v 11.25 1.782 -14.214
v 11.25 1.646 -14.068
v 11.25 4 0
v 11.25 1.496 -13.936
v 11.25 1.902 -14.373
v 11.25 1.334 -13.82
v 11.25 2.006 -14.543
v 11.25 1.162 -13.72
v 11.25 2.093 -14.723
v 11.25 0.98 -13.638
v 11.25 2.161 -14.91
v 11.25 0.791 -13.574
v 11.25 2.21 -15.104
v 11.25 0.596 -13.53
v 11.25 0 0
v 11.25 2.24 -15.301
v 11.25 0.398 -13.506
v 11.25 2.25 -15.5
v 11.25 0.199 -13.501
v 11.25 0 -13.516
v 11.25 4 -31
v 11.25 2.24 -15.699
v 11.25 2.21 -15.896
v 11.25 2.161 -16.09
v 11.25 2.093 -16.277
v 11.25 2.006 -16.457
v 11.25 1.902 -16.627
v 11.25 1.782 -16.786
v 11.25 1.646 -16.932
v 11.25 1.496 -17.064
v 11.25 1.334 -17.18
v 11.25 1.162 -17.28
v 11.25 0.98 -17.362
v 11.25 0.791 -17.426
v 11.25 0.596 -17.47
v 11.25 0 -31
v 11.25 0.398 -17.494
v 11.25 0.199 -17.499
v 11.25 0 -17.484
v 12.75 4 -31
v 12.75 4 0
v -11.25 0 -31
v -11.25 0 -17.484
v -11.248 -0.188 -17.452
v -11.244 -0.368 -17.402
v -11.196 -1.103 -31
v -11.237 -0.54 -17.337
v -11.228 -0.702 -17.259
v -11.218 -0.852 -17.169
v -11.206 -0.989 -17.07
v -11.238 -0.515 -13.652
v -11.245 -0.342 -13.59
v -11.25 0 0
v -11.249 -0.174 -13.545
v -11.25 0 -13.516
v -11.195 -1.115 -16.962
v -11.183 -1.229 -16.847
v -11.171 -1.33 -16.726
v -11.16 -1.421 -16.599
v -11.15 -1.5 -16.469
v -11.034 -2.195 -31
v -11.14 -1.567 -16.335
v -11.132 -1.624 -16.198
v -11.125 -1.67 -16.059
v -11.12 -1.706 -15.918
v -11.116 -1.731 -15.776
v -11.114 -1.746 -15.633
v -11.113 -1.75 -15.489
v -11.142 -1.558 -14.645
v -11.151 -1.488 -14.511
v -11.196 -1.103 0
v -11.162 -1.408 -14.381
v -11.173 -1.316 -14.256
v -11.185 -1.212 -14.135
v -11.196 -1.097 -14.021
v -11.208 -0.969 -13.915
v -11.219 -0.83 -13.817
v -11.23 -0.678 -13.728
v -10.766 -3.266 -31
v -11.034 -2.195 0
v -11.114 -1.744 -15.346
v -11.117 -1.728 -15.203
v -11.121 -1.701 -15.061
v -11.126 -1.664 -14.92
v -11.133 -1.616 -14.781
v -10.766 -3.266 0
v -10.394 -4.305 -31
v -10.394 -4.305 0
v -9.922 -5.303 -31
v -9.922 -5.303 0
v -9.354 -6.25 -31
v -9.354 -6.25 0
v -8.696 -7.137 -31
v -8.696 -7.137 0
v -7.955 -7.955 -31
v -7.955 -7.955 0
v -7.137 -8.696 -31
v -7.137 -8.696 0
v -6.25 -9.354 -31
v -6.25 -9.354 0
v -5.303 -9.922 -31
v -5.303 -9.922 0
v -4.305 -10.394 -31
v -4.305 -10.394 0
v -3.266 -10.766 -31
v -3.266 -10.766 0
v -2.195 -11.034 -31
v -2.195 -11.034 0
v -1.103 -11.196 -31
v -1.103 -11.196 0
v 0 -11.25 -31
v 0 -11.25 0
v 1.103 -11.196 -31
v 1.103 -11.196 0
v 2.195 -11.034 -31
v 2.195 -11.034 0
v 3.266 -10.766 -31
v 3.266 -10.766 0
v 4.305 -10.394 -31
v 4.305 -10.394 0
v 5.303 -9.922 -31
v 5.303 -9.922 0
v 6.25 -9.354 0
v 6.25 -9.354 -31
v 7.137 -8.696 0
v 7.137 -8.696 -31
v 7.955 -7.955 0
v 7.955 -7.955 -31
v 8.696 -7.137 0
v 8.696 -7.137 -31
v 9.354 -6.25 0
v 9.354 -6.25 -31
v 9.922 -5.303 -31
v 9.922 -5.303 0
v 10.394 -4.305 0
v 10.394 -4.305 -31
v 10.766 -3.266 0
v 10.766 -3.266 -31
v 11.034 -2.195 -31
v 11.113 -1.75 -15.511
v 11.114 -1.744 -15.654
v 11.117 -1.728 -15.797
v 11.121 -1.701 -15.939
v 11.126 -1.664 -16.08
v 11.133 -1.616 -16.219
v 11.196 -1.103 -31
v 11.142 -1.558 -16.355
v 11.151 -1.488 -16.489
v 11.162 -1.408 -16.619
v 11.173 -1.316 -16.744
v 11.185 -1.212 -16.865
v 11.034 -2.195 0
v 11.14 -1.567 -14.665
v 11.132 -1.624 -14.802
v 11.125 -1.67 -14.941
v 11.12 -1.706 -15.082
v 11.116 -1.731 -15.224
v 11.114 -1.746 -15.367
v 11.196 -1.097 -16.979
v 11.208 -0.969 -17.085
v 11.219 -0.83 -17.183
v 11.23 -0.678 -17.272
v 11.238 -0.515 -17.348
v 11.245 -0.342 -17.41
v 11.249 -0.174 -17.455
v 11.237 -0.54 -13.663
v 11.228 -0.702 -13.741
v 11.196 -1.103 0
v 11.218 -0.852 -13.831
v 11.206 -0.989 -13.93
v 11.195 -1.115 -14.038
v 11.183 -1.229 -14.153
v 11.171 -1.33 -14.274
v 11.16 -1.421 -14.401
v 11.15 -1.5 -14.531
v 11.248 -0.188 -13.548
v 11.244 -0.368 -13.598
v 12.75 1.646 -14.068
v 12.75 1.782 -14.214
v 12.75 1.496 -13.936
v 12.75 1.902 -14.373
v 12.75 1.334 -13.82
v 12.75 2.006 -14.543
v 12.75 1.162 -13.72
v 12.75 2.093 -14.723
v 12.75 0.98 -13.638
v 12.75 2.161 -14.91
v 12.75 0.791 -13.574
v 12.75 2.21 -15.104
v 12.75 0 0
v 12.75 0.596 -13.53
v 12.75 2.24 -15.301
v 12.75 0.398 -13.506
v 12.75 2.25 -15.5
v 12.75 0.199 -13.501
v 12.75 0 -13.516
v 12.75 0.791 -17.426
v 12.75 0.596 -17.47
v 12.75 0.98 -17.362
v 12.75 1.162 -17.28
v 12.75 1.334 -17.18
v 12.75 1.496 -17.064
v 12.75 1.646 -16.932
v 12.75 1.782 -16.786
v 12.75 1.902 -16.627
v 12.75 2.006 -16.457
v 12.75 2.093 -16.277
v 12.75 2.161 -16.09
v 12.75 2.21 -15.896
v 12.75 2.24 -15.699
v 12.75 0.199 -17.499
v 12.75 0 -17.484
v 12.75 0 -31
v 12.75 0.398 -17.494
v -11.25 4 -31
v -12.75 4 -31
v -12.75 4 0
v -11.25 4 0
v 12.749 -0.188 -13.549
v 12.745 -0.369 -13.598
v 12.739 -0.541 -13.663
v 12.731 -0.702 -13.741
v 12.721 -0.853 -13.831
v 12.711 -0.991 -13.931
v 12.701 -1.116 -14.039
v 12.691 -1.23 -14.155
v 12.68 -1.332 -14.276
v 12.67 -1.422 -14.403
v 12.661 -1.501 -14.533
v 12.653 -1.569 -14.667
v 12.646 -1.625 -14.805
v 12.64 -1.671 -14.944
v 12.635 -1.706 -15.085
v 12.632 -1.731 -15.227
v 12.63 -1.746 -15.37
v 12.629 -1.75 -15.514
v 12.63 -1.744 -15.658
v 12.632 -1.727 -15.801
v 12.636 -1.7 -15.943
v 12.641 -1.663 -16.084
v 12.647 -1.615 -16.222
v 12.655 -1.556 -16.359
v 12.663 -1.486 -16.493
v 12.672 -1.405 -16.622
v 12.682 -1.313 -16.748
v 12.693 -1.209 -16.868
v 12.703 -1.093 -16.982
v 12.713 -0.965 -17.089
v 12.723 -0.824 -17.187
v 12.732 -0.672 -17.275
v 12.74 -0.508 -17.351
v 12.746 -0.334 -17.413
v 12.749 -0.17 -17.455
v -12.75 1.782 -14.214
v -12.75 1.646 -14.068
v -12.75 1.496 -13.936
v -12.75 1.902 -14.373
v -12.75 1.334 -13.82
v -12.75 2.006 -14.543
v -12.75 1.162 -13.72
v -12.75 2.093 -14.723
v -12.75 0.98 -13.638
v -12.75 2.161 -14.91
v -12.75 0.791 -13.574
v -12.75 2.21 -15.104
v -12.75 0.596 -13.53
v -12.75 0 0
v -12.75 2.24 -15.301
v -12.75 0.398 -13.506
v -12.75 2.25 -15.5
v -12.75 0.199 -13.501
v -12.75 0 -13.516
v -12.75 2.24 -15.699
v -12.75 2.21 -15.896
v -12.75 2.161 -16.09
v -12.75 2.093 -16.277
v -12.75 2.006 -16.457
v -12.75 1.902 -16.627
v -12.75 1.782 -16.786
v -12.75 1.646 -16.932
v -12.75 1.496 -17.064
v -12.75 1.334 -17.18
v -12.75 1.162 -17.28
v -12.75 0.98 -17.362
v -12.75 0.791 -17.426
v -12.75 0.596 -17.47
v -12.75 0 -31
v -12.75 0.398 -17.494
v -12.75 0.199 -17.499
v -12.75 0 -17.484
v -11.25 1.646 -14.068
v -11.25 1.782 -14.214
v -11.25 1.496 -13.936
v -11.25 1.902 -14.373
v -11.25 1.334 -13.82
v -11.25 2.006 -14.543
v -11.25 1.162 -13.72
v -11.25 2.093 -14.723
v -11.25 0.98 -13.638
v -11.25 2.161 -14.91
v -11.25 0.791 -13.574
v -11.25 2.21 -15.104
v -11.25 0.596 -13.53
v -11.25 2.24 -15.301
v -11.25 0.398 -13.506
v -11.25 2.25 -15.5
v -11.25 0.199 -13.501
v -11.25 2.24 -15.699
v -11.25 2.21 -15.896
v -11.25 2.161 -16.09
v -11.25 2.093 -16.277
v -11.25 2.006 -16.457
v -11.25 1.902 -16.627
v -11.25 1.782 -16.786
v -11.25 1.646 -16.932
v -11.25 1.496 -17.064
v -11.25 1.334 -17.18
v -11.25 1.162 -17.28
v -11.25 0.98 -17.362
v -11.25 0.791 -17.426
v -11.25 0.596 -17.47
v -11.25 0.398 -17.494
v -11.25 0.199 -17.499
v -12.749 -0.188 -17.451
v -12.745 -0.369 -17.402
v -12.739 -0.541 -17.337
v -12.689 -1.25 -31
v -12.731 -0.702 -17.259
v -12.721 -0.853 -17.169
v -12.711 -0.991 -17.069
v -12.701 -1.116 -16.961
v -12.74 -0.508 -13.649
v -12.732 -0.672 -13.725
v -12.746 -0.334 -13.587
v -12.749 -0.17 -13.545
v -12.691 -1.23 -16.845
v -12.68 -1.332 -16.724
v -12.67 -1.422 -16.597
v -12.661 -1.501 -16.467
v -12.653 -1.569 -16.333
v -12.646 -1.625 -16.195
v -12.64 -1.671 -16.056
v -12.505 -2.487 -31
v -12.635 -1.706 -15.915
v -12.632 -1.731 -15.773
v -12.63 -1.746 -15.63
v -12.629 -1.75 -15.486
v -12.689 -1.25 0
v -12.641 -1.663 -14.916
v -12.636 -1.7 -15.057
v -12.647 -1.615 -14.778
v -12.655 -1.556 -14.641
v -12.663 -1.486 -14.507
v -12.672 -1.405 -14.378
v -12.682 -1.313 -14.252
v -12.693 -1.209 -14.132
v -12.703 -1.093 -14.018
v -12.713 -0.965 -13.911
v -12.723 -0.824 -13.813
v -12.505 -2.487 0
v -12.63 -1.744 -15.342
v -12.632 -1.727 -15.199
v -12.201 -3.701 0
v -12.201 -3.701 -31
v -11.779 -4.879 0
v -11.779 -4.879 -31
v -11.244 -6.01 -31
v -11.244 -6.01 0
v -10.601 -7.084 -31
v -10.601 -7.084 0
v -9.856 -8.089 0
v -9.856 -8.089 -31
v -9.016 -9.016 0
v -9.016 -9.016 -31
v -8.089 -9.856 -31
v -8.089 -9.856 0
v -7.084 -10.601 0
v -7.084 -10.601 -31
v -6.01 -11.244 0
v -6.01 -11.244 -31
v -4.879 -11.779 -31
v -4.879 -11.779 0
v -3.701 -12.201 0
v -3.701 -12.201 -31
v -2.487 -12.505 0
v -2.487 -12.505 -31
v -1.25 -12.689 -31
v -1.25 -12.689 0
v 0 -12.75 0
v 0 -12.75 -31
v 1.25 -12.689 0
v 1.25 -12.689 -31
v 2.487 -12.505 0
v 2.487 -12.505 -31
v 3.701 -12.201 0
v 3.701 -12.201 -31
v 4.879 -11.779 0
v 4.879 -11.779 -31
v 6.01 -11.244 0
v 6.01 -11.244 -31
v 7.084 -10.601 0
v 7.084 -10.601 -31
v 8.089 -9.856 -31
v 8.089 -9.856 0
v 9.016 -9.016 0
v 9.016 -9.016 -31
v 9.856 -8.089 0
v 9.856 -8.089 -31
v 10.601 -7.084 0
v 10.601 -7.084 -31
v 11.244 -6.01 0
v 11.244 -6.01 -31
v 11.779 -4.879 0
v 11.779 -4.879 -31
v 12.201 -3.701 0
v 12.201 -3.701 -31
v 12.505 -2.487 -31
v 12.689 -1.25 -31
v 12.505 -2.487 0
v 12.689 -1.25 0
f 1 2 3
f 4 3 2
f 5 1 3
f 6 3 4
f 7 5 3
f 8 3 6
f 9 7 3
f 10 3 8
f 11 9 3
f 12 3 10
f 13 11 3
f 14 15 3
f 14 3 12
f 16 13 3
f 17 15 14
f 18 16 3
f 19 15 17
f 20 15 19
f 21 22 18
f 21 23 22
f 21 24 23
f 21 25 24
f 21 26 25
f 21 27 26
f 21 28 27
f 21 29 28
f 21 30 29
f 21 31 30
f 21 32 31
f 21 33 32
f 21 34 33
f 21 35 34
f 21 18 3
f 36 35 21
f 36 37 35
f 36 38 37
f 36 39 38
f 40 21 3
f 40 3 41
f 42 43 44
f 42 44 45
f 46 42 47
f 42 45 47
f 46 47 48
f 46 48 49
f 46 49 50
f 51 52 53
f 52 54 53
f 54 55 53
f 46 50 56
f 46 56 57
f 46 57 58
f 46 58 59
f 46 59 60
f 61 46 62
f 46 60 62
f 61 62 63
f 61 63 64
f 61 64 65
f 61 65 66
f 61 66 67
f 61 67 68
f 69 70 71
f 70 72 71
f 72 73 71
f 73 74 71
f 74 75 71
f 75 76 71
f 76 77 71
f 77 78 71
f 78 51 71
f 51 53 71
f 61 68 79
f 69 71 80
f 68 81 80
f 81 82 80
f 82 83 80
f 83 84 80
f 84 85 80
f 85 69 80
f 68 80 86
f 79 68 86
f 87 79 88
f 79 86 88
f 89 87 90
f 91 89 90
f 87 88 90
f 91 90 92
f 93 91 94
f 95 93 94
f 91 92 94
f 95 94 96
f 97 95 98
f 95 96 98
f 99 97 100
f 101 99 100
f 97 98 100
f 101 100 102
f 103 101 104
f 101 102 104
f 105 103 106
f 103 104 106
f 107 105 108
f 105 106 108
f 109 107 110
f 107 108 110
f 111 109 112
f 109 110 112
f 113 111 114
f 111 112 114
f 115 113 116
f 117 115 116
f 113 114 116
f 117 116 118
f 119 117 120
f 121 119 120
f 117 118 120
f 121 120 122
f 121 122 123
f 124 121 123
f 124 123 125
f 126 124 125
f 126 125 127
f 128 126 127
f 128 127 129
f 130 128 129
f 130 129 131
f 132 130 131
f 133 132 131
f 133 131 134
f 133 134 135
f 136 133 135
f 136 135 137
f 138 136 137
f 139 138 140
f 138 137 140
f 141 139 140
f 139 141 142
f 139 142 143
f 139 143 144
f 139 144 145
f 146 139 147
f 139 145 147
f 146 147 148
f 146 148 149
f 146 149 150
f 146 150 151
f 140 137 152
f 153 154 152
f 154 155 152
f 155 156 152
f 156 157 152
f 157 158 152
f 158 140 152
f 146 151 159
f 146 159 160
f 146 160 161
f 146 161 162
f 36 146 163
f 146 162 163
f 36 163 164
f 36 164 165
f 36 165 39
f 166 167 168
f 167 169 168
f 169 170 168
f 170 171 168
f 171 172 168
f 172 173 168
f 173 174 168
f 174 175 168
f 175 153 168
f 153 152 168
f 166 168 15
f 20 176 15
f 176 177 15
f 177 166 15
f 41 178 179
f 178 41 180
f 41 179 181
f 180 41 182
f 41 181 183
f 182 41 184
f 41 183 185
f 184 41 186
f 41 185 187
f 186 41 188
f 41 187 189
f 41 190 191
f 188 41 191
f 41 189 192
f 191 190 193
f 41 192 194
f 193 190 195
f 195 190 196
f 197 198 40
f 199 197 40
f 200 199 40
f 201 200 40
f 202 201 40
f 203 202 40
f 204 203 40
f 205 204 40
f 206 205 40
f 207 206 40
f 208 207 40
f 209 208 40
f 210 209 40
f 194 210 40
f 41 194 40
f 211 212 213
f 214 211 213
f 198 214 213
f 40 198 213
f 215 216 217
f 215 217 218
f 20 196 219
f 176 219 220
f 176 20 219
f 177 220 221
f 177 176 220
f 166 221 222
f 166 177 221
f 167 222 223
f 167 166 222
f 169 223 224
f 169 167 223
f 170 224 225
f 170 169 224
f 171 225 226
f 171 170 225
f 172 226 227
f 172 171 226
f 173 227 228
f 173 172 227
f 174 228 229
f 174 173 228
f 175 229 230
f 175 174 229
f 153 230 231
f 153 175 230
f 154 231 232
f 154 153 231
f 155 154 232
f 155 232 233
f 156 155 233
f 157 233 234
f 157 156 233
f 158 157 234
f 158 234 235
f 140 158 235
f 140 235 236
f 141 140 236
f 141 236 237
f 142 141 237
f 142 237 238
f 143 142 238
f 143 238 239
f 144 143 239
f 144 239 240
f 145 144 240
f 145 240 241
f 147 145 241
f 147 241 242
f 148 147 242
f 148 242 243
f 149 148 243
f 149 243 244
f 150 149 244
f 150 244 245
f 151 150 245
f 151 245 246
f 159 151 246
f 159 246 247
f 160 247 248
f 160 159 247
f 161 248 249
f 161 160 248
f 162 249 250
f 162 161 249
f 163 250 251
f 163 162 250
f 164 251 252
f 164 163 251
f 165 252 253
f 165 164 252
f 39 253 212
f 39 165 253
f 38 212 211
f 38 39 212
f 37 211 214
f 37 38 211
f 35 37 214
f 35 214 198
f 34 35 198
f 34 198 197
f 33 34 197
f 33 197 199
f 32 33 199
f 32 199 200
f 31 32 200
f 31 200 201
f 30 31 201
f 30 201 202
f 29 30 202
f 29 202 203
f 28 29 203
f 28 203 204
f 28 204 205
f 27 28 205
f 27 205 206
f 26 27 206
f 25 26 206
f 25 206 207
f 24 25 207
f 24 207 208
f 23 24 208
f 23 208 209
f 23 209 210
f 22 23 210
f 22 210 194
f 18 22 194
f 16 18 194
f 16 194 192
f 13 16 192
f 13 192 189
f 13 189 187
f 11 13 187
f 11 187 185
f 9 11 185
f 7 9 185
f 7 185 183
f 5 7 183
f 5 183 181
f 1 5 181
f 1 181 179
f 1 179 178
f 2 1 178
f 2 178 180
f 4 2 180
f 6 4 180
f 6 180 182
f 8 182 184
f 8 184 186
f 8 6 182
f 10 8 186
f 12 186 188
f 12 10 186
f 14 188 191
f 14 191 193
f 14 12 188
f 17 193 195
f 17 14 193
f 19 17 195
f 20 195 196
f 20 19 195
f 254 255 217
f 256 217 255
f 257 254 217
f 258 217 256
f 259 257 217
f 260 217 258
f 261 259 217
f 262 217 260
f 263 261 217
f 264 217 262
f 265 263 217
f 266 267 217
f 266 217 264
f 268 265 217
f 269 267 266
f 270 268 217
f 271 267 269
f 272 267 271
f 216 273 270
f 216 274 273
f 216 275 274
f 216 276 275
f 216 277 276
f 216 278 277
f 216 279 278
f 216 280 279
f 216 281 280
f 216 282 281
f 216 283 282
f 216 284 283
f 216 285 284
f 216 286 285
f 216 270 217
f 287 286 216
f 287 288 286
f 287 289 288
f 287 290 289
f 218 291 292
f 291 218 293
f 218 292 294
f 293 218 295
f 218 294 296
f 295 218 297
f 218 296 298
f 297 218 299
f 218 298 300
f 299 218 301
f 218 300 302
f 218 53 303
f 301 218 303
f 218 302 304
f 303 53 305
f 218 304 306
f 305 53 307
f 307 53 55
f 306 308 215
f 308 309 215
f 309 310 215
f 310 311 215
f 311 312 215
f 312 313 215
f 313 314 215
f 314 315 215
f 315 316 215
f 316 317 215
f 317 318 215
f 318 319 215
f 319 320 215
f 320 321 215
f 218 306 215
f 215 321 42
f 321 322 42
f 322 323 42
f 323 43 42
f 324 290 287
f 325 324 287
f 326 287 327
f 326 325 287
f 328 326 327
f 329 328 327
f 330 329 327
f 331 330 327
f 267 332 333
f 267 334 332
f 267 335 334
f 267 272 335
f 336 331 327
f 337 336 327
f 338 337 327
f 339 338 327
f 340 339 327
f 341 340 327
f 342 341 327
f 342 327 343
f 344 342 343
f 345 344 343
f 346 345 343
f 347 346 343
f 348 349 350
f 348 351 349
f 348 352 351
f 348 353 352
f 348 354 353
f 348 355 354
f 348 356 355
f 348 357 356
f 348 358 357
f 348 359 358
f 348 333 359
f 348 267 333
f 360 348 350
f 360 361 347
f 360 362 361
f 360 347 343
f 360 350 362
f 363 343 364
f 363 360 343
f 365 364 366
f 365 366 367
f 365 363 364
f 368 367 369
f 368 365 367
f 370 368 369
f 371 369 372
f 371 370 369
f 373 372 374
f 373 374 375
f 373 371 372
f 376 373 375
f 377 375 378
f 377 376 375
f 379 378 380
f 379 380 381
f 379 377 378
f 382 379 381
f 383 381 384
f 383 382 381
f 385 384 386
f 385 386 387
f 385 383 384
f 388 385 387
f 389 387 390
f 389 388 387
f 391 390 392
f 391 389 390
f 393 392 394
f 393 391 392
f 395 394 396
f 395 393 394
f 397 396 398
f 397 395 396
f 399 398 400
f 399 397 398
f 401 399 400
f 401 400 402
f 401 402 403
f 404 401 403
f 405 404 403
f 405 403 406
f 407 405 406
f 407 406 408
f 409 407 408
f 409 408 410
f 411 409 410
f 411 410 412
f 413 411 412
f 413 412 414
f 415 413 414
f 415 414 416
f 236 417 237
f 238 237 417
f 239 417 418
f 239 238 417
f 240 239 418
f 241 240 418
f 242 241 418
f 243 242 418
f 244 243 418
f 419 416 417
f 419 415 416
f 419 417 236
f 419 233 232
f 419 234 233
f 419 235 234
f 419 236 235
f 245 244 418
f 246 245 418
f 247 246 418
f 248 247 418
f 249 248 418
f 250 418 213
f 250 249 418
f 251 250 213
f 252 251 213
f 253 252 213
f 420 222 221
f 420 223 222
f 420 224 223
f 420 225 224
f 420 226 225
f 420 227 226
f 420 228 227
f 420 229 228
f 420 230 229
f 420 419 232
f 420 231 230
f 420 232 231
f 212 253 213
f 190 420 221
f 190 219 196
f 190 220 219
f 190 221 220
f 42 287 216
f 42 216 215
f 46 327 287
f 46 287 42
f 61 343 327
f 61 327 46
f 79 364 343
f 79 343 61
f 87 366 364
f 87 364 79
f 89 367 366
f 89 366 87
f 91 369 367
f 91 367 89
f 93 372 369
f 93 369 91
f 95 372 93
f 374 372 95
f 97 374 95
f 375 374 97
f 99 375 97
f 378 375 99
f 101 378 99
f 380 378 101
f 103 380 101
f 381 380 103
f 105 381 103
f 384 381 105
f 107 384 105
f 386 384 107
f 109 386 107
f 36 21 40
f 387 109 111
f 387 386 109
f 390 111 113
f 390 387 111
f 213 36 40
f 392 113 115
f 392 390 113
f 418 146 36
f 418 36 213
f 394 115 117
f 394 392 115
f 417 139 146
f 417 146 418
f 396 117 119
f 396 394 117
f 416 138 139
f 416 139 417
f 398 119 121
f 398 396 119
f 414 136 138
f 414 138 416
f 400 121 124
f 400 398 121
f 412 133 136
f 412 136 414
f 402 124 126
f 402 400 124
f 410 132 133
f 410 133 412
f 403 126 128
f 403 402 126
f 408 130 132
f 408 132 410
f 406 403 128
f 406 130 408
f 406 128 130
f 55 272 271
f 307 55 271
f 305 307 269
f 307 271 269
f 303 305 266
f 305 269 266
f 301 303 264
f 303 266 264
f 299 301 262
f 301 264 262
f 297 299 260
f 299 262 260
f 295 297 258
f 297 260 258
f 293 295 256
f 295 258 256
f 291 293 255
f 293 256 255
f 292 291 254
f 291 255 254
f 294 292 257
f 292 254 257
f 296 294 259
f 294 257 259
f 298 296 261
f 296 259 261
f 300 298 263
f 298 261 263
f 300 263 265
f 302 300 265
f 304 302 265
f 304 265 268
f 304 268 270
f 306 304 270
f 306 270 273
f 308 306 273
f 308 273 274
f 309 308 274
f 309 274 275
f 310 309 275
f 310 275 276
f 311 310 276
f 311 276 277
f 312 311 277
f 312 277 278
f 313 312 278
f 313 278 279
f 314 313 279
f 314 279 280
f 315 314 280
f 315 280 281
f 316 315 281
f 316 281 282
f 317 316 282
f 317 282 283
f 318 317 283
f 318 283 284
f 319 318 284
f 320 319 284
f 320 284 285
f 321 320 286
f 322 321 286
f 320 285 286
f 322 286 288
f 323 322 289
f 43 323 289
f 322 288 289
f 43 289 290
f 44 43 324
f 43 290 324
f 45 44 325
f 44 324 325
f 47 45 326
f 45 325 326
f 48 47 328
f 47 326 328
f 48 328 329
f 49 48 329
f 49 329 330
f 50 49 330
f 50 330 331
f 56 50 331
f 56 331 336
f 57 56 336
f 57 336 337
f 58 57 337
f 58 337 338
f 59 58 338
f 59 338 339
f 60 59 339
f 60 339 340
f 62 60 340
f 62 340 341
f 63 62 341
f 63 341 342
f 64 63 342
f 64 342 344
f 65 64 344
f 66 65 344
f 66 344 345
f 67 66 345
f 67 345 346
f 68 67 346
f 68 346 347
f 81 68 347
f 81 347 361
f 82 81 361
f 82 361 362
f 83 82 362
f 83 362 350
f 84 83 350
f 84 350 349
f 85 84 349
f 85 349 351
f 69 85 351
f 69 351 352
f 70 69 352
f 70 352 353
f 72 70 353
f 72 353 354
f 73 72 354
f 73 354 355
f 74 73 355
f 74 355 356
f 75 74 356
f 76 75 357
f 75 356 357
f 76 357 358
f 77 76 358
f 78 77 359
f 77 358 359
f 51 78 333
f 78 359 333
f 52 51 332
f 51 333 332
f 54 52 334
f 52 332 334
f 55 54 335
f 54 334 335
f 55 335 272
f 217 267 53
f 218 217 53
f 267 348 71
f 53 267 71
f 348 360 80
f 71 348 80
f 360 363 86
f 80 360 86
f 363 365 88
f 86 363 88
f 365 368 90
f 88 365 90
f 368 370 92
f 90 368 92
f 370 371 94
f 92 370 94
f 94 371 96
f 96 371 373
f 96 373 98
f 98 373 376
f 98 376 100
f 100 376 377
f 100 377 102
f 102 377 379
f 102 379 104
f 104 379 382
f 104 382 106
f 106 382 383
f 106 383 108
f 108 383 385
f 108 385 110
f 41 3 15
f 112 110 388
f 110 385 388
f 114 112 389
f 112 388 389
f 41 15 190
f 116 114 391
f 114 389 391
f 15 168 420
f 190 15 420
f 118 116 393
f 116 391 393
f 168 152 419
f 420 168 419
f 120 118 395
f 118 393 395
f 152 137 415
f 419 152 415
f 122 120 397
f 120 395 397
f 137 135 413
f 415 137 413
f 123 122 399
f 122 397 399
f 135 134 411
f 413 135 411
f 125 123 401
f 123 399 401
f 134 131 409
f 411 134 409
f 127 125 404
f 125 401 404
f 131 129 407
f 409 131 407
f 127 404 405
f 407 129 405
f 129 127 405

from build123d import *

# Parameters (mm, degrees)
SKETCH1_R           = 12.75
BOSS_EXTRUDE1_DEPTH = 31
SKETCH2_R           = 11.25
CUT_EXTRUDE1_DEPTH  = 31
SKETCH3_W           = 26.062962729
SKETCH3_H           = 13.122907939
CUT_EXTRUDE2_DEPTH  = 31
SKETCH8_W           = 1.5
SKETCH8_H           = 31
BOSS_EXTRUDE3_DEPTH = 4
SKETCH11_R          = 2
CUT_EXTRUDE3_DEPTH  = 2
CUT_EXTRUDE4_START  = -2
SKETCH9_R           = 2
CUT_EXTRUDE4_DEPTH  = 2


with BuildPart() as part:
    # Sketch1 → Boss-Extrude1 (new body)
    with BuildSketch(Plane.XY):
        Circle(SKETCH1_R)
    extrude(amount=-BOSS_EXTRUDE1_DEPTH)

    # Sketch2 → Cut-Extrude1 (cut)
    with BuildSketch(Plane.XY):
        Circle(SKETCH2_R)
    extrude(amount=-CUT_EXTRUDE1_DEPTH, mode=Mode.SUBTRACT)

    # Sketch3 → Cut-Extrude2 (cut)
    with BuildSketch(Plane.XY):
        with Locations((0.281481365, 6.56145397)):
            Rectangle(SKETCH3_W, SKETCH3_H)
    extrude(amount=-CUT_EXTRUDE2_DEPTH, mode=Mode.SUBTRACT)

    # Sketch8 → Boss-Extrude3 (add)
    with BuildSketch(Plane(origin=(0, 0, 0), x_dir=(1, 0, 0), z_dir=(0, 1, 0))):
        with Locations((-12, 15.5)):
            Rectangle(SKETCH8_W, SKETCH8_H)
        with Locations((12, 15.5)):
            Rectangle(SKETCH8_W, SKETCH8_H)
    extrude(amount=BOSS_EXTRUDE3_DEPTH)

    # Sketch11 → Cut-Extrude3 (cut)
    with BuildSketch(Plane.ZY.offset(12.75)):
        with Locations(Location((-15.5, 0.25, 0), (0, 0, 352.819244219))):
            Circle(SKETCH11_R)
    extrude(amount=-CUT_EXTRUDE3_DEPTH, mode=Mode.SUBTRACT)

    # Sketch9 → Cut-Extrude4 (cut)
    with BuildSketch(Plane(origin=(12.75, 0, 0), x_dir=(0, 0, -1), z_dir=(1, 0, 0)).offset(CUT_EXTRUDE4_START)):
        with Locations(Location((15.5, 0.25, 0), (0, 0, 187.180755781))):
            Circle(SKETCH9_R)
    extrude(amount=CUT_EXTRUDE4_DEPTH, mode=Mode.SUBTRACT)


solid = part.part
